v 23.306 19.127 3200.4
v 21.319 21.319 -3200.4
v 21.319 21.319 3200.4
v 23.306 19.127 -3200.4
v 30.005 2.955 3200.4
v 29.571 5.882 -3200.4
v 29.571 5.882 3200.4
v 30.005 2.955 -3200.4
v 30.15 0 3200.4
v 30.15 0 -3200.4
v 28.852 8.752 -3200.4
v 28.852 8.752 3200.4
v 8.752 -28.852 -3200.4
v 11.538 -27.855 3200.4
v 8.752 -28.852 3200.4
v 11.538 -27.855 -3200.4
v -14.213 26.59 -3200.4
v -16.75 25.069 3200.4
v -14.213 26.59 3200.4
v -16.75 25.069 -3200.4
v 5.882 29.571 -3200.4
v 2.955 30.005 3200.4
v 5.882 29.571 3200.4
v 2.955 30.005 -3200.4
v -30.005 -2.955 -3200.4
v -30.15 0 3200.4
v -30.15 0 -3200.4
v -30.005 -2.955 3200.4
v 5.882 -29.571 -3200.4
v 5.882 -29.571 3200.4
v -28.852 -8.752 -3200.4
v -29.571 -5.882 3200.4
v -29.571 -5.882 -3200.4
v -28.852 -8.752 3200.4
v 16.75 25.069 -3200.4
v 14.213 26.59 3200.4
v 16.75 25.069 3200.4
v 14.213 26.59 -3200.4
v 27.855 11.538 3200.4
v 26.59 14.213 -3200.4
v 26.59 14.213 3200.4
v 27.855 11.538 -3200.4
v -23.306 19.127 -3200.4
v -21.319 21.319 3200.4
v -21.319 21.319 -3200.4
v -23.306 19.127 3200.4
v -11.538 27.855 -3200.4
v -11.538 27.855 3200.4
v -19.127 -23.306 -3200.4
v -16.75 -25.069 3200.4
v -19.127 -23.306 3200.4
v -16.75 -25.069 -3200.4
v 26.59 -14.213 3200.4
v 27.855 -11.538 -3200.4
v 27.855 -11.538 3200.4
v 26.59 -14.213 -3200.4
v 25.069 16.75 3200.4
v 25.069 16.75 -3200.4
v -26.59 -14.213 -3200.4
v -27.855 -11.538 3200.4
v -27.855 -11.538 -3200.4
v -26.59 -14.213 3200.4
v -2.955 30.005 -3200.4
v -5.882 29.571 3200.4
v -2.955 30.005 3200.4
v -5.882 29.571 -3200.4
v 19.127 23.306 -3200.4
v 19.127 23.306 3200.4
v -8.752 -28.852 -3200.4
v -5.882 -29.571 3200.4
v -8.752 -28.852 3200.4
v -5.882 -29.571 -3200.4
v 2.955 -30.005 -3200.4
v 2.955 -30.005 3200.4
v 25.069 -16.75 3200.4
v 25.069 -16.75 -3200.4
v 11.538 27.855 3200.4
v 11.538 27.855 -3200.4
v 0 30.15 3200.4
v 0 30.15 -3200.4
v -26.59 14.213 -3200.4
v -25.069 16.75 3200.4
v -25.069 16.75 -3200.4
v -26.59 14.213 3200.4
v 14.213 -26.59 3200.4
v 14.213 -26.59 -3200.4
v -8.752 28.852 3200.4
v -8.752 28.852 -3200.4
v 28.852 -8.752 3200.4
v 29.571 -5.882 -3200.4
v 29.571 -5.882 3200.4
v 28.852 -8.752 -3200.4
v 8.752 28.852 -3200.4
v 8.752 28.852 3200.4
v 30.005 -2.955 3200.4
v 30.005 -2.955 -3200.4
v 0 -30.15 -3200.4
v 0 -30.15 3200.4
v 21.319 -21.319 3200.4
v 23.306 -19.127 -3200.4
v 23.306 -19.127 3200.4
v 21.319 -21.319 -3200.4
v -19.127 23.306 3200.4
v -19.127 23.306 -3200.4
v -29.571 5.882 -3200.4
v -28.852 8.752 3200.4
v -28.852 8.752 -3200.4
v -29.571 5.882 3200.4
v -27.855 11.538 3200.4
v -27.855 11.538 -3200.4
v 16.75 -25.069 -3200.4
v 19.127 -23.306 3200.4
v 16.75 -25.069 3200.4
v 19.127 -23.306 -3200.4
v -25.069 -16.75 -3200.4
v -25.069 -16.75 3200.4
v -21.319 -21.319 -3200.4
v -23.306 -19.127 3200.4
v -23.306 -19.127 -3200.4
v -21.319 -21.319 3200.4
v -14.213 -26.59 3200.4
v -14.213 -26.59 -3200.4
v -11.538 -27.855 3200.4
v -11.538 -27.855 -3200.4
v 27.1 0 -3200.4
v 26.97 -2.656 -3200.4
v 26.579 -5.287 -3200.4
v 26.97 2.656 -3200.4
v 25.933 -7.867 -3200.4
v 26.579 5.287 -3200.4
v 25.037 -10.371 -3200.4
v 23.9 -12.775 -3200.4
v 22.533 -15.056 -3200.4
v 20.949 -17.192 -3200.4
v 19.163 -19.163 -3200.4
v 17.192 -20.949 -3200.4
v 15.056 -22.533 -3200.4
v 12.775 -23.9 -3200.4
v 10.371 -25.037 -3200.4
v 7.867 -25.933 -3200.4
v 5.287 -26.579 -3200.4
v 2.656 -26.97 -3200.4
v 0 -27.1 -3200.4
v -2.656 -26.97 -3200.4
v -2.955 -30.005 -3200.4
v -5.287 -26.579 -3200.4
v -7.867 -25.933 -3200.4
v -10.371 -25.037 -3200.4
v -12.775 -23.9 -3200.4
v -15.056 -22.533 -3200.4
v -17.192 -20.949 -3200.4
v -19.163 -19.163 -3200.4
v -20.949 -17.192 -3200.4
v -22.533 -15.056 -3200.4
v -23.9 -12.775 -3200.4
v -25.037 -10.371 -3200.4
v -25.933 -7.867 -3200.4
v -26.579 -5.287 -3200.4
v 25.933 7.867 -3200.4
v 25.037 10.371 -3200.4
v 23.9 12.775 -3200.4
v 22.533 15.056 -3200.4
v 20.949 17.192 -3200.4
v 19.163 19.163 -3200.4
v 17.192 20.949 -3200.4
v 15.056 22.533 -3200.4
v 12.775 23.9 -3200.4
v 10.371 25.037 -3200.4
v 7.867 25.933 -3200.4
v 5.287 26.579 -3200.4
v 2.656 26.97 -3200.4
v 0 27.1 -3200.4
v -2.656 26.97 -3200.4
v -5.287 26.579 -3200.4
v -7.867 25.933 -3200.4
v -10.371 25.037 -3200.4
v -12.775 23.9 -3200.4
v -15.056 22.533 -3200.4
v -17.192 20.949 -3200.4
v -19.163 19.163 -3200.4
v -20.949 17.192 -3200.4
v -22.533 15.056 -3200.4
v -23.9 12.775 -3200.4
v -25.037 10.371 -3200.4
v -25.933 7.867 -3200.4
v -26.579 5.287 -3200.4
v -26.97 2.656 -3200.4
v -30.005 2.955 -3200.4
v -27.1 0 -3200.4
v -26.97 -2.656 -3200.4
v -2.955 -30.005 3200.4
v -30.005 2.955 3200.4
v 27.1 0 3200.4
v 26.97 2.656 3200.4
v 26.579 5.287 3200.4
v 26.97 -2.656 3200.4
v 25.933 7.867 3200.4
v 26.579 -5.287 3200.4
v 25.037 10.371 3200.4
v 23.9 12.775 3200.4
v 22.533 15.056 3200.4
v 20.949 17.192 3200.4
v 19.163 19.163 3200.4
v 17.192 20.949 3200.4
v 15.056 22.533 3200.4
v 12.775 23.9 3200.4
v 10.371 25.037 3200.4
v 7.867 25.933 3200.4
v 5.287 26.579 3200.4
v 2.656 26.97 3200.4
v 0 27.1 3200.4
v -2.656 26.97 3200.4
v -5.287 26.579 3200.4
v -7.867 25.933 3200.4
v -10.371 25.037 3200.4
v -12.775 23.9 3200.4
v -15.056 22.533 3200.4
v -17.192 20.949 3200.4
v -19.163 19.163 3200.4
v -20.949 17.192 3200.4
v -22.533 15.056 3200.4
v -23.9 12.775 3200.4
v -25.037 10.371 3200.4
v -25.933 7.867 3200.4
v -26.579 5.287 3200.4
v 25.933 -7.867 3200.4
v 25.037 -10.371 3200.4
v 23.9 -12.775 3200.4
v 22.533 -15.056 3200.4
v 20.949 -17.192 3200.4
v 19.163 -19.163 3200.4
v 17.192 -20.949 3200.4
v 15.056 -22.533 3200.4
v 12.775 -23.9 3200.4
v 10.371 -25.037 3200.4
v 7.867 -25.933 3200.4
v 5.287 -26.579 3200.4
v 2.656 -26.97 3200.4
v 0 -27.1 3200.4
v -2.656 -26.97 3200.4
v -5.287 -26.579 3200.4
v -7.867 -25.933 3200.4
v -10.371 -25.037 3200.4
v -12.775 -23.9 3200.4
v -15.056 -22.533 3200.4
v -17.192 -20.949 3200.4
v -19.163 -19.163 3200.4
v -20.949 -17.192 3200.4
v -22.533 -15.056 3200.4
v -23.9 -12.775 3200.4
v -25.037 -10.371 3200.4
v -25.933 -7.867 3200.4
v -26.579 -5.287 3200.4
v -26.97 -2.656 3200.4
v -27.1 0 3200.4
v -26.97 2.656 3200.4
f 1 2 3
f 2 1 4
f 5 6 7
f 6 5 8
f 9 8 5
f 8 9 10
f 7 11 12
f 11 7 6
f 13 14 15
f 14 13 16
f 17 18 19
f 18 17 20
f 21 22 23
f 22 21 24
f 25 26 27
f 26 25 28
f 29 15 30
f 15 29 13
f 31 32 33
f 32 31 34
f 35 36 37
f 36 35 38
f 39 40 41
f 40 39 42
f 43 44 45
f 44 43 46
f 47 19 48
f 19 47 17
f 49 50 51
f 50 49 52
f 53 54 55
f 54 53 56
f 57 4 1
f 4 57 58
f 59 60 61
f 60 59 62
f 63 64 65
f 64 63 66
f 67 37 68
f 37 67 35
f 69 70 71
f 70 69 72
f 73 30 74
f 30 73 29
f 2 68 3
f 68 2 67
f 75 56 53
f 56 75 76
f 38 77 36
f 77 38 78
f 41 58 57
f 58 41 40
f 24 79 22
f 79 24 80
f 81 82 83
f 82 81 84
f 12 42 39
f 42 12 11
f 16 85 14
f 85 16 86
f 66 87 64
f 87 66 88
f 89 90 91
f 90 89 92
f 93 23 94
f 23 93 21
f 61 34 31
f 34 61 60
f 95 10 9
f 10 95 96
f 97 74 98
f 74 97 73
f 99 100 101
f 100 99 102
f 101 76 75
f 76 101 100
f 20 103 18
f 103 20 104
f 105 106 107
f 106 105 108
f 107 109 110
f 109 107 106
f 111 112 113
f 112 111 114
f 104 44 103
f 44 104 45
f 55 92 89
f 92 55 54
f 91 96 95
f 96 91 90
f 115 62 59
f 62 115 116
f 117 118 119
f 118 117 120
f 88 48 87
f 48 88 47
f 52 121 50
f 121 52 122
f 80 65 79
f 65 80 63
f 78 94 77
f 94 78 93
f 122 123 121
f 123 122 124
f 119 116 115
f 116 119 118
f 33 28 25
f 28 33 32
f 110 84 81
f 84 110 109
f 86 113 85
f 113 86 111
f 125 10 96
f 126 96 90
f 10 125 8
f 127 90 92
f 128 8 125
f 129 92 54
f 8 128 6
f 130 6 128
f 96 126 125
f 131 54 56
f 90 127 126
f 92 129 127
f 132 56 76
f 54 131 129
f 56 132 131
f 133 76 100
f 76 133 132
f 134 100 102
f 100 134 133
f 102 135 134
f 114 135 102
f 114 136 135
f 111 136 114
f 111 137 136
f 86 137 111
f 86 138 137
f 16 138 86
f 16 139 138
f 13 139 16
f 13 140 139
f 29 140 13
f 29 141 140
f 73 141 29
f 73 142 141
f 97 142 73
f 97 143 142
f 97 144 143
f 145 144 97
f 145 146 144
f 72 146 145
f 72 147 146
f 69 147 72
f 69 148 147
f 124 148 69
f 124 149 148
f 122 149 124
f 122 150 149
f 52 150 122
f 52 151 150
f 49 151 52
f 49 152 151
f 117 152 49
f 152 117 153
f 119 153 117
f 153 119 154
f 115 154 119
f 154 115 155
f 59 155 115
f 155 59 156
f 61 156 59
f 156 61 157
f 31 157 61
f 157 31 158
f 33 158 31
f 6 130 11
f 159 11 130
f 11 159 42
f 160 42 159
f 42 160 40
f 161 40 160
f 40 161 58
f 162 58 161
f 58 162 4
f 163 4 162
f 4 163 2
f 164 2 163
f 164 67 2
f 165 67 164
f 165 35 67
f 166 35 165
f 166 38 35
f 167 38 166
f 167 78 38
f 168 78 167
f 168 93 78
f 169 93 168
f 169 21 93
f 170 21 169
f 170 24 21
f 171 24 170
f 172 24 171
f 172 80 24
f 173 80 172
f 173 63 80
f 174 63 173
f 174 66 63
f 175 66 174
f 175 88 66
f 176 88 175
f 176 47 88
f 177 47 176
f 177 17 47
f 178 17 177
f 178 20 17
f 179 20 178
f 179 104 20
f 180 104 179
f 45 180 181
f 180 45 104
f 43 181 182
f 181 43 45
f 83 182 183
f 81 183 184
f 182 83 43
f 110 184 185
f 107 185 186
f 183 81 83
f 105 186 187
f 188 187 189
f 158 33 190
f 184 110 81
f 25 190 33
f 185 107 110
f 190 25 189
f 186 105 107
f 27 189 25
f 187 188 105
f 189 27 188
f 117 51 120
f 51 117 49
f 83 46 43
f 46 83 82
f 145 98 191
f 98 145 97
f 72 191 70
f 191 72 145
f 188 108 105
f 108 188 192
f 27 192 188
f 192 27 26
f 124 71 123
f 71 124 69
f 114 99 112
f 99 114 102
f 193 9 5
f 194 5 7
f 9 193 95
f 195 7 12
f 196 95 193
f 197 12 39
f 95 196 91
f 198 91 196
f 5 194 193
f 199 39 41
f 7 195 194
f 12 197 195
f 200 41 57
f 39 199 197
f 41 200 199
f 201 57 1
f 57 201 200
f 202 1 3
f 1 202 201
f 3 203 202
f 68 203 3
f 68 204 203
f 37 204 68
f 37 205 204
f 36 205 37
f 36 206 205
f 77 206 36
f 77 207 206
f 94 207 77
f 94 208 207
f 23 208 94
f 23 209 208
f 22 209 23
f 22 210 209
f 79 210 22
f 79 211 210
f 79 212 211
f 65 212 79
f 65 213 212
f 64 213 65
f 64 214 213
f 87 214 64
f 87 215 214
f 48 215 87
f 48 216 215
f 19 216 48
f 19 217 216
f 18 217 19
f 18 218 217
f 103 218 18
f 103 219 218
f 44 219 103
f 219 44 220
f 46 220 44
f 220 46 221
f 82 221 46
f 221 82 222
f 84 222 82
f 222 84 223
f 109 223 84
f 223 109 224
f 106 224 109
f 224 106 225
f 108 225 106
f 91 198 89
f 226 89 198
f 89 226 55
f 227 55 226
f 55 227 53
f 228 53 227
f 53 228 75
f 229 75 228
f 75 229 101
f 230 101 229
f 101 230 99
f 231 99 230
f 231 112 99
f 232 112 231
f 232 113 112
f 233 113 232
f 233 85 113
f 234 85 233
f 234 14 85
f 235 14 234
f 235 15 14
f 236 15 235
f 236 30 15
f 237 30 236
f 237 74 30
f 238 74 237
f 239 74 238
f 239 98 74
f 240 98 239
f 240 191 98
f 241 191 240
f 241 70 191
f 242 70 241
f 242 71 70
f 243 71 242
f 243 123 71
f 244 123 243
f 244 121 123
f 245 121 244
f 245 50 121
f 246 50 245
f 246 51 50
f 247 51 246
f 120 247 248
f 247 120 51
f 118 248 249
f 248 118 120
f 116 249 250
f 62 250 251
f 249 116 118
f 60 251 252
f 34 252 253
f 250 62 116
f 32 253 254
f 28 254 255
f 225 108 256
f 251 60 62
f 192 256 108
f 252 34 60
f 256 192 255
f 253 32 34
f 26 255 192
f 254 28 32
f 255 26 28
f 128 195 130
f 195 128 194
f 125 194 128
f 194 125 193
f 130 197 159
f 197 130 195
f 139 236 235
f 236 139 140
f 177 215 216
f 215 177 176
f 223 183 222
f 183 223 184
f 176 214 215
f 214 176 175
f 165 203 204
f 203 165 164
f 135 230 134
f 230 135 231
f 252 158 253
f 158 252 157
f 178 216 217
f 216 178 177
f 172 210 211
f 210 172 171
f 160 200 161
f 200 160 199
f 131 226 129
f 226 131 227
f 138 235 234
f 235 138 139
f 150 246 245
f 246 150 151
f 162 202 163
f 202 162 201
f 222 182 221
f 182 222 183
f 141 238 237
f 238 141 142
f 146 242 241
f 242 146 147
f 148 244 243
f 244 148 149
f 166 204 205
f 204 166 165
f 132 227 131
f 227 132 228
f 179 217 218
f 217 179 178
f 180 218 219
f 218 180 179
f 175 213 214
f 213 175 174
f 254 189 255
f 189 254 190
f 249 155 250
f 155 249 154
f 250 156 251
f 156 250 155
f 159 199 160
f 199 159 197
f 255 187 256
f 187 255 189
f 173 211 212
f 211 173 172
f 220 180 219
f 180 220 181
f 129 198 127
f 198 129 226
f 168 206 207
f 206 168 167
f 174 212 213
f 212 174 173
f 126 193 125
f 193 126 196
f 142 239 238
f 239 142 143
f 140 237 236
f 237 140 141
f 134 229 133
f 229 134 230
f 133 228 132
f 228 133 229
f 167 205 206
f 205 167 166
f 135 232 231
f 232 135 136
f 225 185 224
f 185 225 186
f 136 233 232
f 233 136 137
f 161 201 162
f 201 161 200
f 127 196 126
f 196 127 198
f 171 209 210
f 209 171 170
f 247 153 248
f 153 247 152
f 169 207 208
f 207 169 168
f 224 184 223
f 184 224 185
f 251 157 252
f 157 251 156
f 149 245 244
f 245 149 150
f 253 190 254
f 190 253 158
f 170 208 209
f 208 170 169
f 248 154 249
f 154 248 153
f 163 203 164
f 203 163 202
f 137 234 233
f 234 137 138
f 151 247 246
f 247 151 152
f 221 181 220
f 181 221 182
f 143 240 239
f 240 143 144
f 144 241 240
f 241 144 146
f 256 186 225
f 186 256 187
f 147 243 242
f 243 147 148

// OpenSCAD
// Auto-generated by scripts/author_from_manifest.py (Phase D.3).
// Source: data/phase_d_manifest.json (sku_intent='wheatland-sch40-black-2in-21ft').
// Do not hand-edit — regenerate from the manifest.
//
// @part wheatland_sch40_black_2in_21ft
// @kind pipe_segment
// @category pipe.sch40.black.steel
// @display-name "Sch40 Black Steel 2\" x 21ft"
// @mfg wheatland_tube
// @price-usd 29.00
// @install-minutes 4
// @crew journeyman
// @param size_in number default=2 label="Size" unit="in"
// @port inlet position=[0,0,-0.5] direction=[0,0,-1] style=grooved size_in=2 role=run_a
// @port outlet position=[0,0,0.5] direction=[0,0,1] style=grooved size_in=2 role=run_b

size_in  = 2.0;
length_m = 6.4008;
schedule = "sch10";

function od_mm(nps) =
    nps ==  0.75 ? 26.7 :
    nps ==   1  ? 33.4 :
    nps == 1.25 ? 42.2 :
    nps == 1.5  ? 48.3 :
    nps ==   2  ? 60.3 :
    nps == 2.5  ? 73.0 :
    nps ==   3  ? 88.9 :
    nps ==   4  ? 114.3 :
    nps ==   5  ? 141.3 :
    nps ==   6  ? 168.3 :
    nps ==   8  ? 219.1 :
    nps ==  10  ? 273.0 : 60.3;

function wall_mm(nps, sched) =
    sched == "sch40"
        ? (nps <= 1.5 ? 3.68 : nps <= 3 ? 5.49 : 6.02)
        : (nps <= 1.5 ? 2.77 : nps <= 3 ? 3.05 : 3.68);

od = od_mm(size_in);
id = od - 2 * wall_mm(size_in, schedule);
len_mm = length_m * 1000;

difference() {
    cylinder(h = len_mm, d = od, center = true, $fn = 64);
    cylinder(h = len_mm + 1, d = id, center = true, $fn = 64);
}
